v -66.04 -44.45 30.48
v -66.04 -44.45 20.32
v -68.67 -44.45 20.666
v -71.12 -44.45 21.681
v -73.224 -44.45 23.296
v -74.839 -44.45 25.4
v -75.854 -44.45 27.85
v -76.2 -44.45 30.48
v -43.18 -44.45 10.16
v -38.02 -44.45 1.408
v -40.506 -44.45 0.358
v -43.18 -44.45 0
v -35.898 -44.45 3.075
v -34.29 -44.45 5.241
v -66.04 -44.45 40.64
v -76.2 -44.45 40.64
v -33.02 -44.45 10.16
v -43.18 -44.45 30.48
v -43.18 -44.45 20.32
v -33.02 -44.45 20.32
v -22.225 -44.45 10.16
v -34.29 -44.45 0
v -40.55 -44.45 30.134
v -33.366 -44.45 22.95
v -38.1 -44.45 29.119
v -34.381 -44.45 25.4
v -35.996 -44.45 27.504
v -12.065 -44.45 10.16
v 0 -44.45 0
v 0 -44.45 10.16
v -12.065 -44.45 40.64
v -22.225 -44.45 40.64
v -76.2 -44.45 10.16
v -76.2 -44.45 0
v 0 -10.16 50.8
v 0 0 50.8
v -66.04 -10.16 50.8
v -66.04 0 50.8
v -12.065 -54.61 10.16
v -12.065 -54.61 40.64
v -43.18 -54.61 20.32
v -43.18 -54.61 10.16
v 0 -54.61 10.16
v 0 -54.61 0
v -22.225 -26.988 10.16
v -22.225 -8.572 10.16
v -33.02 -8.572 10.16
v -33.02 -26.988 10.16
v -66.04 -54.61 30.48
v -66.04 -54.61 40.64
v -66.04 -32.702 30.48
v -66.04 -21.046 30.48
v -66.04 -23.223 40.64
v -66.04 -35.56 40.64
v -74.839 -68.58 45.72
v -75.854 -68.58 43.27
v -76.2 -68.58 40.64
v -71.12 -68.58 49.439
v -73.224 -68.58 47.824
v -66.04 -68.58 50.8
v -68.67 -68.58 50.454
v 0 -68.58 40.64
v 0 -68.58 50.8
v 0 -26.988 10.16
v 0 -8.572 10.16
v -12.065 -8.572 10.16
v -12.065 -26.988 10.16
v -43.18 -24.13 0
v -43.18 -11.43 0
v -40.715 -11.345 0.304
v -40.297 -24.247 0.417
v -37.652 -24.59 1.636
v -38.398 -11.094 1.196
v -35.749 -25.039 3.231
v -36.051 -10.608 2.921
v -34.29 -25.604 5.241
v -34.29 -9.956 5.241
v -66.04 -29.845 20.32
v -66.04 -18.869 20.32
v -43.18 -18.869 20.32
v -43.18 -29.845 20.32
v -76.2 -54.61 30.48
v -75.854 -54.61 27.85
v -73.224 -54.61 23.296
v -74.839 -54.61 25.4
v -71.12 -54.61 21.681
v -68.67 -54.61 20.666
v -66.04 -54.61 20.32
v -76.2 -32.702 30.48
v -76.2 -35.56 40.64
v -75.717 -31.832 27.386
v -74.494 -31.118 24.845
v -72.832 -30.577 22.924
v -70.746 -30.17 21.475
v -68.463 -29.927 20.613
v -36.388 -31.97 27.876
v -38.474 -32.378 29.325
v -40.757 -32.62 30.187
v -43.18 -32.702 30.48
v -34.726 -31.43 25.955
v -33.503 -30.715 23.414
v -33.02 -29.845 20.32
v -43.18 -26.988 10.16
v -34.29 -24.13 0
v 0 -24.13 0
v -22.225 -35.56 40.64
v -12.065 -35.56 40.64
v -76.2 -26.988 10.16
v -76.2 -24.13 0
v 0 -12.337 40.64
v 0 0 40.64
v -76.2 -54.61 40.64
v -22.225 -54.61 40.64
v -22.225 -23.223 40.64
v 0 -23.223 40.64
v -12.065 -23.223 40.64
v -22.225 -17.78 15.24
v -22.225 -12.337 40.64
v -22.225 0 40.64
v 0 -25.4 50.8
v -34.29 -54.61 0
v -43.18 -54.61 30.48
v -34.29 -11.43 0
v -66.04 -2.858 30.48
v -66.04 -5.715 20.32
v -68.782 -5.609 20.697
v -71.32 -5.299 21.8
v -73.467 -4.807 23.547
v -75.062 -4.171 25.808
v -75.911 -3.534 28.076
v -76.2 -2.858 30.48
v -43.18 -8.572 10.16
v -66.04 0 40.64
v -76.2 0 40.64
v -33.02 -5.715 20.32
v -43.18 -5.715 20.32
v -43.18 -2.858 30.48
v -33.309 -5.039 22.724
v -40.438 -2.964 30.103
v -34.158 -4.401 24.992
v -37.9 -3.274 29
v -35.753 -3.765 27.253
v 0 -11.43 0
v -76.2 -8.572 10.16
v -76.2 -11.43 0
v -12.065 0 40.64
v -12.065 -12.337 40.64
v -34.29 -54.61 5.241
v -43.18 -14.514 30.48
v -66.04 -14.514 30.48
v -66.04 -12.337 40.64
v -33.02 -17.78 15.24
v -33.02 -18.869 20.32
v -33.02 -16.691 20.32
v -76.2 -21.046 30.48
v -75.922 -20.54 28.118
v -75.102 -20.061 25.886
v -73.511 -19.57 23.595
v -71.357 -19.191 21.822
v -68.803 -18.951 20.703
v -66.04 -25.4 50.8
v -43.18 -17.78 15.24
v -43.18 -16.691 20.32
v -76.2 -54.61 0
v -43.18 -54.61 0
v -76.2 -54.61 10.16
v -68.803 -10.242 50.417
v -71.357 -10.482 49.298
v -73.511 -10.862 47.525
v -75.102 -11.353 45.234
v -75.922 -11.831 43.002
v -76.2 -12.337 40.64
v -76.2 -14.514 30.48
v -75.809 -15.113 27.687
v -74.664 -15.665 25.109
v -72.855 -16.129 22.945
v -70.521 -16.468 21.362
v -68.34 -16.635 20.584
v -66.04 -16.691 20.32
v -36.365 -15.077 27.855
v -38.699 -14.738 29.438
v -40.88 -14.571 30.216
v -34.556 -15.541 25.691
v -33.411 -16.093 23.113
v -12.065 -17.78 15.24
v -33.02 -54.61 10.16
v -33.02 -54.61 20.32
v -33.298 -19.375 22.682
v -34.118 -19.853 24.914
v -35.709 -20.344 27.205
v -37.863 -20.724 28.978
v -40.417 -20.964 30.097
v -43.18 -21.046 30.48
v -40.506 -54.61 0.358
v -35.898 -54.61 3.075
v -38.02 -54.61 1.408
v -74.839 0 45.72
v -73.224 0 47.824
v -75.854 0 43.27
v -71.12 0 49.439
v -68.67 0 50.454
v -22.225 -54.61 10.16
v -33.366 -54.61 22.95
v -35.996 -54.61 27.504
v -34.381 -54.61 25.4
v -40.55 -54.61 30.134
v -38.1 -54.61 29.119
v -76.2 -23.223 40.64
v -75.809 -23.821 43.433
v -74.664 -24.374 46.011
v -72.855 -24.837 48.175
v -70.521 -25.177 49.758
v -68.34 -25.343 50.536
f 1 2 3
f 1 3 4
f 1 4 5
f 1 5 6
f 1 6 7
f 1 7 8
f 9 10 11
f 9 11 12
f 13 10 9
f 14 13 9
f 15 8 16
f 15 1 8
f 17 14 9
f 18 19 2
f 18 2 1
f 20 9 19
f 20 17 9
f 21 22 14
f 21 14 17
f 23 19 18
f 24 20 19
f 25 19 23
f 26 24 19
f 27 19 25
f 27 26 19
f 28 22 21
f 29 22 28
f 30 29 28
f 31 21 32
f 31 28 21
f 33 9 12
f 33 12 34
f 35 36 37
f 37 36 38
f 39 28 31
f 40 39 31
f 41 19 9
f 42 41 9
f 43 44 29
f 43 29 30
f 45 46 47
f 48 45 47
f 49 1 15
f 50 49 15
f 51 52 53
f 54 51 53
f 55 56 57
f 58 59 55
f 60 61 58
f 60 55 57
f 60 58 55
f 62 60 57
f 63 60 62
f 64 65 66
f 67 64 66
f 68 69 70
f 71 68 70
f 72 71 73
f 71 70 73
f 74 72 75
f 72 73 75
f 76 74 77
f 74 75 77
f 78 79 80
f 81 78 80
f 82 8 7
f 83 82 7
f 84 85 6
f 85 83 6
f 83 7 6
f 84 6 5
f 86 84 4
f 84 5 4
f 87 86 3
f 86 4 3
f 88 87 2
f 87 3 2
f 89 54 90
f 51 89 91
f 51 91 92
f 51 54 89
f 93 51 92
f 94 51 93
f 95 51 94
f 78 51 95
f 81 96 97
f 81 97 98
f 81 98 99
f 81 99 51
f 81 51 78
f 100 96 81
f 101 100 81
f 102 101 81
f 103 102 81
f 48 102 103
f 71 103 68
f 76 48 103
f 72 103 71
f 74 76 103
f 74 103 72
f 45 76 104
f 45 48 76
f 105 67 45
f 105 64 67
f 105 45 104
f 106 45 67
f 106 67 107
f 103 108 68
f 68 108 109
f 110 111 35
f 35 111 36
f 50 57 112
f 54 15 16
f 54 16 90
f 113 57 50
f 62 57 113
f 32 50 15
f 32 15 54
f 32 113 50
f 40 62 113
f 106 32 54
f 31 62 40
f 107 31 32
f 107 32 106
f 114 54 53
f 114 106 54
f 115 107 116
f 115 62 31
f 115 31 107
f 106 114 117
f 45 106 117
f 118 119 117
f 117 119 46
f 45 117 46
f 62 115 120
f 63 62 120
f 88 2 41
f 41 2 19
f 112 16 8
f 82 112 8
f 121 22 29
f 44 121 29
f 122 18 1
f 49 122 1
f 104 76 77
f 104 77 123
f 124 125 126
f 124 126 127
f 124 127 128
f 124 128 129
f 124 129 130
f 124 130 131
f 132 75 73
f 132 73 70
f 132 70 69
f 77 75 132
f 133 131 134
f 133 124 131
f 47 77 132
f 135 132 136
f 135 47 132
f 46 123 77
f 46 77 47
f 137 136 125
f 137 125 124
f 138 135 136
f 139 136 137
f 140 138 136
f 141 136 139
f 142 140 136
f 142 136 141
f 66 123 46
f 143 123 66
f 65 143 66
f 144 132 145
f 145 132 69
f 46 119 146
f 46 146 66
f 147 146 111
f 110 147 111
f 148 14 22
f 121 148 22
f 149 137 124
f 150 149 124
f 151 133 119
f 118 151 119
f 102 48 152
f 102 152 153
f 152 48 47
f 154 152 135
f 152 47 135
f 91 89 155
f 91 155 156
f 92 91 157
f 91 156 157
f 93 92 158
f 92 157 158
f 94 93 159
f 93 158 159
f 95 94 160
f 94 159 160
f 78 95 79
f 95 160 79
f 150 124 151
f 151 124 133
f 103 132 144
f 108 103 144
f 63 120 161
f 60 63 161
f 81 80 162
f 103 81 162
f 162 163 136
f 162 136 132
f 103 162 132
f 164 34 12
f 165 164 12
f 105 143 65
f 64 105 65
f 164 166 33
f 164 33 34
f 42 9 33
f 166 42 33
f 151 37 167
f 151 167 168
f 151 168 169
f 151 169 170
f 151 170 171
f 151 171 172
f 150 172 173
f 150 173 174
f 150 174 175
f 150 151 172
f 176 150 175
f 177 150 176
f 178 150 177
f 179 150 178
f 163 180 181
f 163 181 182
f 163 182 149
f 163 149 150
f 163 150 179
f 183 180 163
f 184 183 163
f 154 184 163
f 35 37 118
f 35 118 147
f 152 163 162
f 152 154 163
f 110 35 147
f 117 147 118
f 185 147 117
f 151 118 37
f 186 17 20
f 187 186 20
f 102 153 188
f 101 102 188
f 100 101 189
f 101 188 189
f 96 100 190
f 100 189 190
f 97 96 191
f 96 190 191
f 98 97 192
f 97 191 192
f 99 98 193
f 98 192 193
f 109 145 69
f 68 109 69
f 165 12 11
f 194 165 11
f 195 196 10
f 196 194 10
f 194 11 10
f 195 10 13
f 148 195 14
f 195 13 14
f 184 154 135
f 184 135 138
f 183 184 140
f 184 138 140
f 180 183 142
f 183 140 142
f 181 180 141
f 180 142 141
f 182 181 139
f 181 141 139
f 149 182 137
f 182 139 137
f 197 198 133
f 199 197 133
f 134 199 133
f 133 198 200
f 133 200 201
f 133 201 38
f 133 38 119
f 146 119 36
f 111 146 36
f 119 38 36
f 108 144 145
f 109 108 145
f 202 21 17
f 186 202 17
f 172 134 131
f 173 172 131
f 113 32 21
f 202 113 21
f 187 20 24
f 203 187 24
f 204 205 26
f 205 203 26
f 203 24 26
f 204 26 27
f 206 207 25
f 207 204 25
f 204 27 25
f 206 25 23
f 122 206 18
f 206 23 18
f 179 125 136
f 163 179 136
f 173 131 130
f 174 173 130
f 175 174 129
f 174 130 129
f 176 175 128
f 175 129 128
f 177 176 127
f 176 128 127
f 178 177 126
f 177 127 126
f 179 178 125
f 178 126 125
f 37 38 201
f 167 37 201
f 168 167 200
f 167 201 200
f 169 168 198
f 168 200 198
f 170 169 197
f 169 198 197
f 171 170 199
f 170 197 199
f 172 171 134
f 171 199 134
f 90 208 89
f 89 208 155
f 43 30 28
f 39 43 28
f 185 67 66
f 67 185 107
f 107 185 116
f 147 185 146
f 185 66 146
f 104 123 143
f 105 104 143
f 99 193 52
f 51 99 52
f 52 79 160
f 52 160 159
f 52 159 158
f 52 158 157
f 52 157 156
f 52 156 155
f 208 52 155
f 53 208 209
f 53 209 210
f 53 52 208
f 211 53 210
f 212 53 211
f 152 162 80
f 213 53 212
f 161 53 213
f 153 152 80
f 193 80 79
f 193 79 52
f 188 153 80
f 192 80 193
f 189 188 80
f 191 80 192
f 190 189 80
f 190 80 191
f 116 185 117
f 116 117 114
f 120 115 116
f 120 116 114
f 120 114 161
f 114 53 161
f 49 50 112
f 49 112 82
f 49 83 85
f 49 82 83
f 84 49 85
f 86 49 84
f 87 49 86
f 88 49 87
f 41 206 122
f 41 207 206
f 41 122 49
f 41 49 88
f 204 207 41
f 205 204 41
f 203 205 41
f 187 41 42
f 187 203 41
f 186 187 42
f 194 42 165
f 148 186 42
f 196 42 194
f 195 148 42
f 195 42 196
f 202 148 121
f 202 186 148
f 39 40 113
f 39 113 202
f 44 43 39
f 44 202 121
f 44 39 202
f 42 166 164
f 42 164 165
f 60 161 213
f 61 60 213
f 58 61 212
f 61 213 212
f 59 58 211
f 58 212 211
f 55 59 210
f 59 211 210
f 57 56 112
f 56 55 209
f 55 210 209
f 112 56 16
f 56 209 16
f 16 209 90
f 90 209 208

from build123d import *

# Parameters (mm, degrees)
F1_DEPTH = 68.58
F3_DEPTH = 76.201


with BuildPart() as f1:
    # F0 (on Front) → F1 (new body)
    with BuildSketch(Plane.XZ):
        with BuildLine():
            Line((-34.29, 0), (0, 0))
            Line((0, 0), (0, 10.16))
            Line((0, 10.16), (-12.065, 10.16))
            Line((-12.065, 10.16), (-12.065, 40.64))
            Line((-12.065, 40.64), (0, 40.64))
            Line((0, 40.64), (0, 50.8))
            Line((0, 50.8), (-66.04, 50.8))
            ThreePointArc((-66.04, 50.8), (-73.224205, 47.824205), (-76.2, 40.64))
            Line((-76.2, 40.64), (-76.2, 30.48))
            ThreePointArc((-76.2, 30.48), (-73.224205, 23.295795), (-66.04, 20.32))
            Line((-66.04, 20.32), (-43.18, 20.32))
            Line((-43.18, 20.32), (-43.18, 10.16))
            Line((-43.18, 10.16), (-76.2, 10.16))
            Line((-76.2, 10.16), (-76.2, 0))
            Line((-76.2, 0), (-43.18, 0))
            ThreePointArc((-43.18, 0), (-38.019975, 1.407872), (-34.29, 5.241311))
            Line((-34.29, 5.241311), (-34.29, 0))
        make_face()
        with BuildLine():
            Line((-22.225, 10.16), (-33.02, 10.16))
            Line((-33.02, 10.16), (-33.02, 20.32))
            ThreePointArc((-33.02, 20.32), (-35.995795, 27.504205), (-43.18, 30.48))
            Line((-43.18, 30.48), (-66.04, 30.48))
            Line((-66.04, 30.48), (-66.04, 40.64))
            Line((-66.04, 40.64), (-22.225, 40.64))
            Line((-22.225, 40.64), (-22.225, 10.16))
        make_face(mode=Mode.SUBTRACT)
    extrude(amount=F1_DEPTH)

    # F2 (on Right) → F3 (intersect, through all)
    with BuildSketch(Plane.YZ):
        Polygon((-11.43, 0), (0, 40.64), (0, 50.8), (-10.16, 50.8), (-17.78, 15.24), (-25.4, 50.8), (-35.56, 50.8), (-68.58, 50.8), (-68.58, 40.64), (-54.61, 40.64), (-54.61, 0), (-44.45, 0), (-44.45, 40.64), (-35.56, 40.64), (-24.13, 0), align=None)
    extrude(amount=-F3_DEPTH, mode=Mode.INTERSECT)


solid = f1.part
